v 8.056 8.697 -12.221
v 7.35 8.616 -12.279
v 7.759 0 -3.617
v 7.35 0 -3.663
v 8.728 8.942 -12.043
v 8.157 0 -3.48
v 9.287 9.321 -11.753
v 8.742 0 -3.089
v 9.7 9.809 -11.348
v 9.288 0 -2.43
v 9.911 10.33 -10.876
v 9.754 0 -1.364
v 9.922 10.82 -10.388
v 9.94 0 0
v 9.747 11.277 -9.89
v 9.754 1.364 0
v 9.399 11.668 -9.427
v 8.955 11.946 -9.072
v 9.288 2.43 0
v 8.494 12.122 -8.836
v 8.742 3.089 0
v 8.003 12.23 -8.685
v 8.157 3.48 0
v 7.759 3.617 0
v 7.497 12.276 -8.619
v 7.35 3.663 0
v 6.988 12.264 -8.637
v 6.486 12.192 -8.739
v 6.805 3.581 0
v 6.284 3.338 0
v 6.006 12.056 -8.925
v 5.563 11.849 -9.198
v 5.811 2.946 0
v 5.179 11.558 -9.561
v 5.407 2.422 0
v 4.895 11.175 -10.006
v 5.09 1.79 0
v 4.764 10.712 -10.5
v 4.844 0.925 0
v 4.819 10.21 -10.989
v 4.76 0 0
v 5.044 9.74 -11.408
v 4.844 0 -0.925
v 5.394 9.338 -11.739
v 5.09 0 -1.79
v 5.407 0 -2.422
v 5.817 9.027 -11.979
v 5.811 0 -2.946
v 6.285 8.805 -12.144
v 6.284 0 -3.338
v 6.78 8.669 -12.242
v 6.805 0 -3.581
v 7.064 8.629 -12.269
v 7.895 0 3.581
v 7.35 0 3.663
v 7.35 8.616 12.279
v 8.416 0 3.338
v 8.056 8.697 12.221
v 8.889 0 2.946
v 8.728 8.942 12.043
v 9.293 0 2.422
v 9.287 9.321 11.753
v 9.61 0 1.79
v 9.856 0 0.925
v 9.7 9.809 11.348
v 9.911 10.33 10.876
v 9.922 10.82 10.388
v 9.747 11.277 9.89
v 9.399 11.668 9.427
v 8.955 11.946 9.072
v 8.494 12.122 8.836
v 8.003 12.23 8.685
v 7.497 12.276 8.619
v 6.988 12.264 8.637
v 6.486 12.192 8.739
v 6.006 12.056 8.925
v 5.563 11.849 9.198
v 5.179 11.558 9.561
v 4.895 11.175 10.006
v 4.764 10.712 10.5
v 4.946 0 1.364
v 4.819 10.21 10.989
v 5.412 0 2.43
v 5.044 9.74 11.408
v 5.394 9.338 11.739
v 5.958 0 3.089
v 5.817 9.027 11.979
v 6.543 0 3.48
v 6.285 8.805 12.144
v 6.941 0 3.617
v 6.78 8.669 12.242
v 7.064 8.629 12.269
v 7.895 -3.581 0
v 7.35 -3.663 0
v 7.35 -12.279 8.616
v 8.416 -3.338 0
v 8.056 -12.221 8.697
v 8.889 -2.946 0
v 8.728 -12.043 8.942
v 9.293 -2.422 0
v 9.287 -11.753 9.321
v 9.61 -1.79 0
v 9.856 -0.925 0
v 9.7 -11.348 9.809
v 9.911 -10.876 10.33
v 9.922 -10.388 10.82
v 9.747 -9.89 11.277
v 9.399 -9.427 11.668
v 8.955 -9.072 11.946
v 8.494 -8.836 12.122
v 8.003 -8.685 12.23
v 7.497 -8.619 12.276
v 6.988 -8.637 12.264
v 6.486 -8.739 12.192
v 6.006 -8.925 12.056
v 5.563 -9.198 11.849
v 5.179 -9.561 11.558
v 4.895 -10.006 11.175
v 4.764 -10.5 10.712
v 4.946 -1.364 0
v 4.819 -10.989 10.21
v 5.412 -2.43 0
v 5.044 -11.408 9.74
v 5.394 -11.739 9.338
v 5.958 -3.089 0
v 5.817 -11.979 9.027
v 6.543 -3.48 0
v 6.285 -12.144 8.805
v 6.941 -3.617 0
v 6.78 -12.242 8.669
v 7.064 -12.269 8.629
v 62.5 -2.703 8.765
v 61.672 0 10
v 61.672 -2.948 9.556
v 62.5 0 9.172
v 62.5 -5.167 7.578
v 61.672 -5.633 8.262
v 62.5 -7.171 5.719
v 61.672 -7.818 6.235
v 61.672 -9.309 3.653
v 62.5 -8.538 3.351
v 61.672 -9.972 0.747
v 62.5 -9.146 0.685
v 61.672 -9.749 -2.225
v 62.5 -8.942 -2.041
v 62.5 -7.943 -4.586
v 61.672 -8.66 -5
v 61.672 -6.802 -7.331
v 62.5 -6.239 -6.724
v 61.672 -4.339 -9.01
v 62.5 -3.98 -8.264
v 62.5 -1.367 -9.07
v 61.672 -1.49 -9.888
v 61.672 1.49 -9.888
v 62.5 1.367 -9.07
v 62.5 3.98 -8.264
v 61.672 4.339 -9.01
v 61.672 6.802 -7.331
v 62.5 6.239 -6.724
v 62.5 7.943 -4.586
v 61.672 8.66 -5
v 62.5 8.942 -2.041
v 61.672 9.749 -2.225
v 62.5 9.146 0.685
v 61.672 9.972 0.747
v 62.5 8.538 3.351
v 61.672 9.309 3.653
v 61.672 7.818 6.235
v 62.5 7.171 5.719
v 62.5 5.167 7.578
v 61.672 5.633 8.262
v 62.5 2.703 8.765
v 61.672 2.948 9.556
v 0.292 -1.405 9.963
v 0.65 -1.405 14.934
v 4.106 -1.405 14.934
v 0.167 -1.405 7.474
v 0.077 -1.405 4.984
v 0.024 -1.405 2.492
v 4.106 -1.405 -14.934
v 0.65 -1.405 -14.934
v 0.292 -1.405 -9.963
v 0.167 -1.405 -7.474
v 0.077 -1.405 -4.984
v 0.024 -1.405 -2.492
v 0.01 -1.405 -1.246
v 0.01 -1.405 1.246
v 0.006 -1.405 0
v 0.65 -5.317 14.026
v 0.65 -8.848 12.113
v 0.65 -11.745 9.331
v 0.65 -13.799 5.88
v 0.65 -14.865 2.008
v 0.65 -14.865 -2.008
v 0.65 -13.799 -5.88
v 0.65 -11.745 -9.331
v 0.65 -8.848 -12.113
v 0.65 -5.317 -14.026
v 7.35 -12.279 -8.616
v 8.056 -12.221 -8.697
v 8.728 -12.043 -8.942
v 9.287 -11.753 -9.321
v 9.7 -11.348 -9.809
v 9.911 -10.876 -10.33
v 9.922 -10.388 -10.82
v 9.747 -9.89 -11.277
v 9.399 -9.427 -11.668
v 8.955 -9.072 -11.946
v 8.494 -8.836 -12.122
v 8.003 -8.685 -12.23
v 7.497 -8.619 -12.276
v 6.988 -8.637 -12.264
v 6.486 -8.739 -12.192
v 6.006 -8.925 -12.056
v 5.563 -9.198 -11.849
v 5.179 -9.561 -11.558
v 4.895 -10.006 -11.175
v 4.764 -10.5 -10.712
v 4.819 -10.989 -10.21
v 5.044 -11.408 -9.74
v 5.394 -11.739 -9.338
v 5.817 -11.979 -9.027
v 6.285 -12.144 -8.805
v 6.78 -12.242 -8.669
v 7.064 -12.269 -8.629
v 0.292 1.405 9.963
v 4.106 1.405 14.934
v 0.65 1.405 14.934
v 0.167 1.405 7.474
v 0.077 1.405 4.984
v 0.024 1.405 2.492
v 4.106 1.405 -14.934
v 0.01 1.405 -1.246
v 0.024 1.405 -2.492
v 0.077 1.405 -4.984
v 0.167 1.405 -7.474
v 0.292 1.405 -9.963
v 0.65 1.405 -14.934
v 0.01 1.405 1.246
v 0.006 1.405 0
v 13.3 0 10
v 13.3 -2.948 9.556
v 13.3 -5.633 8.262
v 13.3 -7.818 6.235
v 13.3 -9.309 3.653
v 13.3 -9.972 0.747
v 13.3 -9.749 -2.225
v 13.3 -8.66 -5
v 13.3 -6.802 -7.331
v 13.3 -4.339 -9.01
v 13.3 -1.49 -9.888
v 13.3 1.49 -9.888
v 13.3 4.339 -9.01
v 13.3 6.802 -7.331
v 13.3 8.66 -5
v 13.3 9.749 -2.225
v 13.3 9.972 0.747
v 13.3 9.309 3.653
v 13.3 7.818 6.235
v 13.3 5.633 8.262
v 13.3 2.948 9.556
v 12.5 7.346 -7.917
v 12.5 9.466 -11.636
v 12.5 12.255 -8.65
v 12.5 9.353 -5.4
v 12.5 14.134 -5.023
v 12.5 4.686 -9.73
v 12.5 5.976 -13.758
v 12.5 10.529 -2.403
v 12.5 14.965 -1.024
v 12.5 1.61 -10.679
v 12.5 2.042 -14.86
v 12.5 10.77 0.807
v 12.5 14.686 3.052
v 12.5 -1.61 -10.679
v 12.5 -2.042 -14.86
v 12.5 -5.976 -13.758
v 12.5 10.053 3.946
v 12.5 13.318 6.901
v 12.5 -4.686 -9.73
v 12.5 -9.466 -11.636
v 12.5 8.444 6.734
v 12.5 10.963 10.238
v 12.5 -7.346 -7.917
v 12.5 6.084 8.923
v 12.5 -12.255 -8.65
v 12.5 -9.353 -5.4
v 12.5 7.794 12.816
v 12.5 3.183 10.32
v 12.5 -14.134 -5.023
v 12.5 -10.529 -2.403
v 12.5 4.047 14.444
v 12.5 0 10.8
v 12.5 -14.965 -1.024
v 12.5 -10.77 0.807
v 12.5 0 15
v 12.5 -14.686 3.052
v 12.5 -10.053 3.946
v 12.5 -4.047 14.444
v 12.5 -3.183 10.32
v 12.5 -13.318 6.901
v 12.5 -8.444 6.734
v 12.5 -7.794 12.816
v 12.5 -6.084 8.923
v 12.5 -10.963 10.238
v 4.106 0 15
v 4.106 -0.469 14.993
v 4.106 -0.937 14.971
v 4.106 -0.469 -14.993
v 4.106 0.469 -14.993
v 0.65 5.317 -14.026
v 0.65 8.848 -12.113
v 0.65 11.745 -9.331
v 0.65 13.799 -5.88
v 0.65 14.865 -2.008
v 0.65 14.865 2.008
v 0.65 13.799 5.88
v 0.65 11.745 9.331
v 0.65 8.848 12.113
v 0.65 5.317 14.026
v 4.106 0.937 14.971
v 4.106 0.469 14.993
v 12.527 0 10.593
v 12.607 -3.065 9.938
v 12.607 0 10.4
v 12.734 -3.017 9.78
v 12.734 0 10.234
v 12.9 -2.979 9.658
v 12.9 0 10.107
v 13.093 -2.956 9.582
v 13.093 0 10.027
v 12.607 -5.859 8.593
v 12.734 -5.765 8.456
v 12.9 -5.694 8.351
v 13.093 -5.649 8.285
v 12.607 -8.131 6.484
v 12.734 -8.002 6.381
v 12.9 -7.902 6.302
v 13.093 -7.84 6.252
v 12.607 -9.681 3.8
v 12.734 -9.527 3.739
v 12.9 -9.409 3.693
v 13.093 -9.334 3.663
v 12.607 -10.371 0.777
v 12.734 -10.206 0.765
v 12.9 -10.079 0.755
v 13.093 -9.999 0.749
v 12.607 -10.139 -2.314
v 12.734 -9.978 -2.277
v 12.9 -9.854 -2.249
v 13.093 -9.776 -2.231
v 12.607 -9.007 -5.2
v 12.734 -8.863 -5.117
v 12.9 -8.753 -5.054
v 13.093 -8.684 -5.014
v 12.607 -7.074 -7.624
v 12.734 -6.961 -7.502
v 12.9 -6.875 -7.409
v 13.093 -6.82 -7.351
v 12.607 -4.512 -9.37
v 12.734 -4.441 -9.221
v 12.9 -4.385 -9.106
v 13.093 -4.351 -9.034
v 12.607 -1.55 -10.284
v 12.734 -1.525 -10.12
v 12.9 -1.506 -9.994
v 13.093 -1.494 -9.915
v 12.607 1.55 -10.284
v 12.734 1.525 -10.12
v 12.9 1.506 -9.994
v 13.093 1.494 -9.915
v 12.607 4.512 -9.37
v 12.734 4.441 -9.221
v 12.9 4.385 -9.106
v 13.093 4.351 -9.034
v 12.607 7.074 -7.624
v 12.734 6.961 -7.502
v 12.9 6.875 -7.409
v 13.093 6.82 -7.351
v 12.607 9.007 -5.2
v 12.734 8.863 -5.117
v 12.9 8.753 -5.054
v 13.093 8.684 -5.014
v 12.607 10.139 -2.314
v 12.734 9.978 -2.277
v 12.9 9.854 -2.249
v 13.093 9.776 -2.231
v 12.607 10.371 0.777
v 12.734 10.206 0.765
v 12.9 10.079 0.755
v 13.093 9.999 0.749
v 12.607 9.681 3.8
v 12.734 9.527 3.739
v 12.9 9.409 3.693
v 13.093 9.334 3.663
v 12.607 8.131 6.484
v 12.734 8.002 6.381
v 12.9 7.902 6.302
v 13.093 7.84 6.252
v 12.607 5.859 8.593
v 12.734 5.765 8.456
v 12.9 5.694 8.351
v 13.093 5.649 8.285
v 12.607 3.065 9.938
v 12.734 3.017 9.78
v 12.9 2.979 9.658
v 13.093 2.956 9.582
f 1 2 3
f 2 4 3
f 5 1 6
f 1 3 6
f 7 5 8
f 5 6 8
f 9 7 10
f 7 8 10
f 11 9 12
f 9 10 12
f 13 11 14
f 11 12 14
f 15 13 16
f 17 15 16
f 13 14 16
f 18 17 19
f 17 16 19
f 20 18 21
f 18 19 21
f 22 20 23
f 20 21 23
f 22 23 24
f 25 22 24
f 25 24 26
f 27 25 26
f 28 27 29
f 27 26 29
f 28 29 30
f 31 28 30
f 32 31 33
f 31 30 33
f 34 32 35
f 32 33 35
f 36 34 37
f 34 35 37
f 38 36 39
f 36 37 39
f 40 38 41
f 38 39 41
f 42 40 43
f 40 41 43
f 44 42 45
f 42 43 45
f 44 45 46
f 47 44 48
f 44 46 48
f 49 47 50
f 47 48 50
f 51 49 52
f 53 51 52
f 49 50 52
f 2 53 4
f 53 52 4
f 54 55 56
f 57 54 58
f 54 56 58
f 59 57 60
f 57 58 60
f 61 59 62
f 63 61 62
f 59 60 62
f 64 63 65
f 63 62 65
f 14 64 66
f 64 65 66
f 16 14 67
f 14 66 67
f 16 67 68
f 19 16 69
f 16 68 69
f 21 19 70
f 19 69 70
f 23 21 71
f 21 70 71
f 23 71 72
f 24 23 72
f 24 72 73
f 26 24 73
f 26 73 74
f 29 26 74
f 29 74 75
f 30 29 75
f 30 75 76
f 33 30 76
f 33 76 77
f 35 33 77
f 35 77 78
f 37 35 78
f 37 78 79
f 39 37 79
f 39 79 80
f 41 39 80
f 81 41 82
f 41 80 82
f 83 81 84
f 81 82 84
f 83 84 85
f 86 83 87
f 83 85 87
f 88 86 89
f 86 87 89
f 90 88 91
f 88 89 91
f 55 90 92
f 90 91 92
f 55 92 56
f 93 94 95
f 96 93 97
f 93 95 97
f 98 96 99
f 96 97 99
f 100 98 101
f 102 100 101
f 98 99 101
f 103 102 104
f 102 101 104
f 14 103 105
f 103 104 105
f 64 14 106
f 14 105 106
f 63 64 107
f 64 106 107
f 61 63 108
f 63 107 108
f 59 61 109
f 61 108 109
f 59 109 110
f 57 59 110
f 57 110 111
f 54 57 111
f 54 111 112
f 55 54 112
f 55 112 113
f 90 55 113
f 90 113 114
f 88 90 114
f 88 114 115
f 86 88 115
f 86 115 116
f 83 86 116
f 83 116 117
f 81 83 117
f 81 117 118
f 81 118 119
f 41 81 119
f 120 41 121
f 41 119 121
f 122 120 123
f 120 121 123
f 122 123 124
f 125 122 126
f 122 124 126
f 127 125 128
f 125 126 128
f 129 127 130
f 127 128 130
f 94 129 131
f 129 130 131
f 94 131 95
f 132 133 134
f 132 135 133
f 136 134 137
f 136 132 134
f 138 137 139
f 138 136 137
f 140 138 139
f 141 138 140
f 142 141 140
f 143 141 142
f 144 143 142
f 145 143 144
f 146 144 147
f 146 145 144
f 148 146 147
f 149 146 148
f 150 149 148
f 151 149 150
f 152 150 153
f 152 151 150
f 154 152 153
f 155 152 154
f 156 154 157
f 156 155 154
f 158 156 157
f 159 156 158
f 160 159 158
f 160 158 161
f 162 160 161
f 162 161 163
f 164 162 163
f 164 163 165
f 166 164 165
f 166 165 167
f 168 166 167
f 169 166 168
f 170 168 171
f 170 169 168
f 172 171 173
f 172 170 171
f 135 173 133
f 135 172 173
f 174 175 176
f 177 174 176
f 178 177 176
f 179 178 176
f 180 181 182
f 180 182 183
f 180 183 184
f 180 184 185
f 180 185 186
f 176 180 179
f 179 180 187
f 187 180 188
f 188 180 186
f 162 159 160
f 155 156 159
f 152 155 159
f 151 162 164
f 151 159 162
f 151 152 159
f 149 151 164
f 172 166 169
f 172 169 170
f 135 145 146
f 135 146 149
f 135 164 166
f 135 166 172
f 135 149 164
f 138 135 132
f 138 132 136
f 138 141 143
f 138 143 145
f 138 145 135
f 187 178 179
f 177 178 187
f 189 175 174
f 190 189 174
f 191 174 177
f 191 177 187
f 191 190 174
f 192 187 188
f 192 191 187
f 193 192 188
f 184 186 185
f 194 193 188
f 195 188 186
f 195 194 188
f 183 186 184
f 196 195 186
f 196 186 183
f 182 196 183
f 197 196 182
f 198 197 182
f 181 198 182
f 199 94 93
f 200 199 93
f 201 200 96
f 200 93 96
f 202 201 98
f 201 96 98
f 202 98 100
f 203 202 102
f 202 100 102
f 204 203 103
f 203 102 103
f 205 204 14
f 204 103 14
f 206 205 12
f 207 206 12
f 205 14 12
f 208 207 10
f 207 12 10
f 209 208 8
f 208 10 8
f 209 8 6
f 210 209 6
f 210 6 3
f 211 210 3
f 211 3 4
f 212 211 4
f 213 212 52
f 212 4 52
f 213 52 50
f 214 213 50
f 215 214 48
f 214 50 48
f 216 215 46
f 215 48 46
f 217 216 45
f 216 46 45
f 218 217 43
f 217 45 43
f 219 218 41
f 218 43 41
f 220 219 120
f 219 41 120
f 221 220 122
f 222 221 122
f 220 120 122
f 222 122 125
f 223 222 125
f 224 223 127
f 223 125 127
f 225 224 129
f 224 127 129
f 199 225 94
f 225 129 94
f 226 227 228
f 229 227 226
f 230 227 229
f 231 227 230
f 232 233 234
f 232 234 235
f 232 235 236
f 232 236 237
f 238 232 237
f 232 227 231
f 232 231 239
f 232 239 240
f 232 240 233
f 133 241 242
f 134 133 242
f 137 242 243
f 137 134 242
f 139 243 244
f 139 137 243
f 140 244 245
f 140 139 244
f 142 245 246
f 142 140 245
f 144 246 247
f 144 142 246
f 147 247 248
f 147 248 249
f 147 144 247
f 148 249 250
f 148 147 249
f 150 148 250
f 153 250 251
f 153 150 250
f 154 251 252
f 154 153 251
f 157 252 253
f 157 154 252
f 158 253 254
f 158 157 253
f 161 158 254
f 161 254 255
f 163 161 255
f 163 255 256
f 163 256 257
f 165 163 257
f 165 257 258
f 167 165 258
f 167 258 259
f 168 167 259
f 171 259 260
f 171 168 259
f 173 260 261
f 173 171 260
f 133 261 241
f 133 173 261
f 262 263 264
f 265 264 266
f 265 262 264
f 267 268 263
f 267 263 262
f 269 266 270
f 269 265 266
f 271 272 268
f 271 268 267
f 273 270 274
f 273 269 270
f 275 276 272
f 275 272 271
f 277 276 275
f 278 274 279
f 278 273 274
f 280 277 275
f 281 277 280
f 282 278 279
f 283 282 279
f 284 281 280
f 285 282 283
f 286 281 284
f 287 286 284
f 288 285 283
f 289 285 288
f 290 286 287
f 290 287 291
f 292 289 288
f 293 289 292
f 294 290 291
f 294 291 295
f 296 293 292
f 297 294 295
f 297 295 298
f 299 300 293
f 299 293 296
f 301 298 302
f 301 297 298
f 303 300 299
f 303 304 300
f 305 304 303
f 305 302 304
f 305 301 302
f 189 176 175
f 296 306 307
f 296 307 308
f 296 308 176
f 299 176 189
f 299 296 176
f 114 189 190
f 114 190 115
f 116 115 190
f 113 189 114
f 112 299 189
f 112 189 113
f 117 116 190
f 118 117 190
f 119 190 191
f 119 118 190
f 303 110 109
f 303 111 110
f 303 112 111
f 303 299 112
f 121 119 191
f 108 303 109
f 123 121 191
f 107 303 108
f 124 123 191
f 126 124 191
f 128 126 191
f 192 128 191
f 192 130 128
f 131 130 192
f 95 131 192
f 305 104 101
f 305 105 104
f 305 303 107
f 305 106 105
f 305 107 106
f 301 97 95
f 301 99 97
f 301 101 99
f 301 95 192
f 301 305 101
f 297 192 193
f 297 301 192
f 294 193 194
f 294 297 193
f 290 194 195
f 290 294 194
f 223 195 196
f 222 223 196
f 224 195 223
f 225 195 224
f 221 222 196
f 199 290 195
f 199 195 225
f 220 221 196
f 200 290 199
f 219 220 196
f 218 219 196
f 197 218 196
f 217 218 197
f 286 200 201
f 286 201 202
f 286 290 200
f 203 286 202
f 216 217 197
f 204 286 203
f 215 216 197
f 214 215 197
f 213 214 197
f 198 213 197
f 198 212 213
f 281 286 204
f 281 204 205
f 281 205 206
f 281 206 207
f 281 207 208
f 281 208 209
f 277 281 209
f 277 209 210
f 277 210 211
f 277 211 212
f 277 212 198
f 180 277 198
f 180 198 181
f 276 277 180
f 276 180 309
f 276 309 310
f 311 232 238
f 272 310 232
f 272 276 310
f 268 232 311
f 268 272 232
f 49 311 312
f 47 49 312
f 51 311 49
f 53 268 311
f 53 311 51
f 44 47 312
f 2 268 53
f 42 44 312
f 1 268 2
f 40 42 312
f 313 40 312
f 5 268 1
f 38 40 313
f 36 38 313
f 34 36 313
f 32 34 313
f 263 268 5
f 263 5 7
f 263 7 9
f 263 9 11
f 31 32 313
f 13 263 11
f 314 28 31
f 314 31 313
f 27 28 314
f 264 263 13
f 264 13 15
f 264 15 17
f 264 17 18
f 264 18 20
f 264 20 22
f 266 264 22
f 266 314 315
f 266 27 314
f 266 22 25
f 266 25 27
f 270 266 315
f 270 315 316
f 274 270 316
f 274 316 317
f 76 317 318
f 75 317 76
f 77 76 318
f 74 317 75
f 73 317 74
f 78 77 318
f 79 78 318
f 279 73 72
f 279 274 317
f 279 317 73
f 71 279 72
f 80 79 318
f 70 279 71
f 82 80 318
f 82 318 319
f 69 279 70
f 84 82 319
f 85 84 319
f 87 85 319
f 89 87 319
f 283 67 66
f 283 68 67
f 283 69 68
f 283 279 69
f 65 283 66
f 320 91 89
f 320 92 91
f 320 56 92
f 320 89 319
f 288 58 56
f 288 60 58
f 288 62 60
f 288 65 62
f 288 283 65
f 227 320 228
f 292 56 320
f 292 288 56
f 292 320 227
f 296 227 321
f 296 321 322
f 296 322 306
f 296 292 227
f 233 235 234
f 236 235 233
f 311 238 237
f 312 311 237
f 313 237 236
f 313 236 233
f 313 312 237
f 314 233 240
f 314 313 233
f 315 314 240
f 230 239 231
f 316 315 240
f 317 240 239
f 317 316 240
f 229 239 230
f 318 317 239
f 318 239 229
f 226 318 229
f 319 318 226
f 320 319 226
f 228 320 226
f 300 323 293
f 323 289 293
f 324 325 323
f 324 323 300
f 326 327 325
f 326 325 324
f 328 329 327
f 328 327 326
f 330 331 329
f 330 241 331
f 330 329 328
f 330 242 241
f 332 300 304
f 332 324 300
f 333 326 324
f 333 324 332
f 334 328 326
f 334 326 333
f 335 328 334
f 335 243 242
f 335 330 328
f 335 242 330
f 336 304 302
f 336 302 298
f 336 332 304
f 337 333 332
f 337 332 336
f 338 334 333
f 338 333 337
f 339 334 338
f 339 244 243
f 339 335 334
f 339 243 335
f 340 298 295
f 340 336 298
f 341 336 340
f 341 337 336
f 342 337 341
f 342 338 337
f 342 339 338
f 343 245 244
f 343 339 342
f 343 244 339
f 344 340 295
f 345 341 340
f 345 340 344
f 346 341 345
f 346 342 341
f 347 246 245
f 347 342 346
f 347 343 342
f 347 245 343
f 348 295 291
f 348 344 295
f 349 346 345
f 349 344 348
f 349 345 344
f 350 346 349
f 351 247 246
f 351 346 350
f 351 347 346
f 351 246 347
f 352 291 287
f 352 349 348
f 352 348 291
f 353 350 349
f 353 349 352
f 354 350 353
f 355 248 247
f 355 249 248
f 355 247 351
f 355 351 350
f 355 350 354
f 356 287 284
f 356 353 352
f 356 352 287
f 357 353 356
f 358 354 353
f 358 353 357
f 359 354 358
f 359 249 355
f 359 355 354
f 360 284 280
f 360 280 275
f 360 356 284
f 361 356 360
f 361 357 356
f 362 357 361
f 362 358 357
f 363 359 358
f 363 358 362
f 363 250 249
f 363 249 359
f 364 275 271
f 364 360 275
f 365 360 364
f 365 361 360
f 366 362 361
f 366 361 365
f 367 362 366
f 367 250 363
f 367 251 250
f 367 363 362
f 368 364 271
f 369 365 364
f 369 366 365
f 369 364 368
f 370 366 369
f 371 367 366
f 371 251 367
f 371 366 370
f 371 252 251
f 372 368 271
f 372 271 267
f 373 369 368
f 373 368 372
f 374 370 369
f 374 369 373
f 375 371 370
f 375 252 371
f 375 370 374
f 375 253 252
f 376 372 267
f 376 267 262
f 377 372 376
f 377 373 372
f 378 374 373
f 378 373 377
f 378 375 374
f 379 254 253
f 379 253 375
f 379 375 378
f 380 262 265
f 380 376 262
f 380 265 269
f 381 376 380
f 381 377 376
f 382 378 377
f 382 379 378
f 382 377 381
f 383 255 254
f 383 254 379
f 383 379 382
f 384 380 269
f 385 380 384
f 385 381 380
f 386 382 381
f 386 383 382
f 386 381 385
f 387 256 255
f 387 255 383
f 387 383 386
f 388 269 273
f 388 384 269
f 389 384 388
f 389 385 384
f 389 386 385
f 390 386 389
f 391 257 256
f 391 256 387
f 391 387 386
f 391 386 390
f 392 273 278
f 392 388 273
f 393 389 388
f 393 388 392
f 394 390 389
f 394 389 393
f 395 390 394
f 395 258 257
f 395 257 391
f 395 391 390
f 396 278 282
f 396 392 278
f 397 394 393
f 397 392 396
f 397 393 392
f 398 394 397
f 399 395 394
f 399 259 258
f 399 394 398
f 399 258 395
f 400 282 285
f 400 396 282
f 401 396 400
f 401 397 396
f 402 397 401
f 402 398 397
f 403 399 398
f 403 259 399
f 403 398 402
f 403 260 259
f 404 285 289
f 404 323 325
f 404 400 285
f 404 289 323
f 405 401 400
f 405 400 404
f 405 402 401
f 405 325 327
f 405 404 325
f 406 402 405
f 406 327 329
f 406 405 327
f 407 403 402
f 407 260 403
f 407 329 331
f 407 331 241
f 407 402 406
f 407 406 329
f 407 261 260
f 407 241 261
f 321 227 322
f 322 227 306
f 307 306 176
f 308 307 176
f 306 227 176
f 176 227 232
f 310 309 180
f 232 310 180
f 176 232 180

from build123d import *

# Parameters (mm, degrees)
FILLET1_R         = 0.8
SLOT_DEPTH        = 67.001893912
SLOT_DEPTH_BACK   = 67.001893912
HOLESKE_R         = 2.59
DRILL_HOLE_DEPTH  = 67.001893912
DRILL_HOLES_COUNT = 2
DRILL_HOLES_ANGLE = 90


with BuildPart() as part:
    # BodySke → Base-Revolve (revolve)
    with BuildSketch(Plane.XY, mode=Mode.PRIVATE) as base_revolve_sk:
        with BuildLine():
            Line((0.65, 15), (12.5, 15))
            Line((12.5, 15), (12.5, 10))
            Line((12.5, 10), (61.672, 10))
            Line((61.672, 10), (62.5, 9.172))
            Line((62.5, 9.172), (62.5, 0))
            Line((62.5, 0), (0, 0))
            ThreePointArc((0, 0), (0.162576213, 7.507038364), (0.65, 15))
        make_face()
    revolve(base_revolve_sk.sketch.rotate(Axis((-31.75, 0, 0), (1, 0, 0)), 90), axis=Axis((-31.75, 0, 0), (1, 0, 0)))

    # Fillet1
    fillet1_edges = [part.edges().sort_by_distance(p)[0] for p in [
        (12.5, 0, -10),
    ]]
    fillet(fillet1_edges, radius=FILLET1_R)

    # Sketch3 → Slot (cut, two sides: drawn at the far end of the back side and taken through both)
    with BuildSketch(Plane.XY.offset(-SLOT_DEPTH_BACK)):
        Polygon((-139.217564887, 1.405), (0.005692144, 1.405), (4.105692144, 1.405), (4.105692144, -1.405), (0.005692144, -1.405), (-139.217564887, -1.405), (-417.664078948, -1.405), (-417.664078948, 1.405), align=None)
    extrude(amount=SLOT_DEPTH + SLOT_DEPTH_BACK, mode=Mode.SUBTRACT)

    # HoleSke → Drill Hole (cut, symmetric)
    with BuildSketch(Plane(origin=(0, 0, 0), x_dir=(1, 0, 0), z_dir=(0, 0.7071067811865462, 0.7071067811865488))):
        with Locations(Location((7.35, 0, 0), (0, 0, 270))):
            Circle(HOLESKE_R)
    drill_hole = extrude(amount=DRILL_HOLE_DEPTH, both=True, mode=Mode.SUBTRACT)

    # Drill Holes: Drill Hole ×2 about axis
    drill_holes_axis = Axis((0, 0, 0), (1, 0, 0))
    for i in range(1, DRILL_HOLES_COUNT):
        add(drill_hole.rotate(drill_holes_axis, i * DRILL_HOLES_ANGLE / (DRILL_HOLES_COUNT - 1)), mode=Mode.SUBTRACT)


solid = part.part
